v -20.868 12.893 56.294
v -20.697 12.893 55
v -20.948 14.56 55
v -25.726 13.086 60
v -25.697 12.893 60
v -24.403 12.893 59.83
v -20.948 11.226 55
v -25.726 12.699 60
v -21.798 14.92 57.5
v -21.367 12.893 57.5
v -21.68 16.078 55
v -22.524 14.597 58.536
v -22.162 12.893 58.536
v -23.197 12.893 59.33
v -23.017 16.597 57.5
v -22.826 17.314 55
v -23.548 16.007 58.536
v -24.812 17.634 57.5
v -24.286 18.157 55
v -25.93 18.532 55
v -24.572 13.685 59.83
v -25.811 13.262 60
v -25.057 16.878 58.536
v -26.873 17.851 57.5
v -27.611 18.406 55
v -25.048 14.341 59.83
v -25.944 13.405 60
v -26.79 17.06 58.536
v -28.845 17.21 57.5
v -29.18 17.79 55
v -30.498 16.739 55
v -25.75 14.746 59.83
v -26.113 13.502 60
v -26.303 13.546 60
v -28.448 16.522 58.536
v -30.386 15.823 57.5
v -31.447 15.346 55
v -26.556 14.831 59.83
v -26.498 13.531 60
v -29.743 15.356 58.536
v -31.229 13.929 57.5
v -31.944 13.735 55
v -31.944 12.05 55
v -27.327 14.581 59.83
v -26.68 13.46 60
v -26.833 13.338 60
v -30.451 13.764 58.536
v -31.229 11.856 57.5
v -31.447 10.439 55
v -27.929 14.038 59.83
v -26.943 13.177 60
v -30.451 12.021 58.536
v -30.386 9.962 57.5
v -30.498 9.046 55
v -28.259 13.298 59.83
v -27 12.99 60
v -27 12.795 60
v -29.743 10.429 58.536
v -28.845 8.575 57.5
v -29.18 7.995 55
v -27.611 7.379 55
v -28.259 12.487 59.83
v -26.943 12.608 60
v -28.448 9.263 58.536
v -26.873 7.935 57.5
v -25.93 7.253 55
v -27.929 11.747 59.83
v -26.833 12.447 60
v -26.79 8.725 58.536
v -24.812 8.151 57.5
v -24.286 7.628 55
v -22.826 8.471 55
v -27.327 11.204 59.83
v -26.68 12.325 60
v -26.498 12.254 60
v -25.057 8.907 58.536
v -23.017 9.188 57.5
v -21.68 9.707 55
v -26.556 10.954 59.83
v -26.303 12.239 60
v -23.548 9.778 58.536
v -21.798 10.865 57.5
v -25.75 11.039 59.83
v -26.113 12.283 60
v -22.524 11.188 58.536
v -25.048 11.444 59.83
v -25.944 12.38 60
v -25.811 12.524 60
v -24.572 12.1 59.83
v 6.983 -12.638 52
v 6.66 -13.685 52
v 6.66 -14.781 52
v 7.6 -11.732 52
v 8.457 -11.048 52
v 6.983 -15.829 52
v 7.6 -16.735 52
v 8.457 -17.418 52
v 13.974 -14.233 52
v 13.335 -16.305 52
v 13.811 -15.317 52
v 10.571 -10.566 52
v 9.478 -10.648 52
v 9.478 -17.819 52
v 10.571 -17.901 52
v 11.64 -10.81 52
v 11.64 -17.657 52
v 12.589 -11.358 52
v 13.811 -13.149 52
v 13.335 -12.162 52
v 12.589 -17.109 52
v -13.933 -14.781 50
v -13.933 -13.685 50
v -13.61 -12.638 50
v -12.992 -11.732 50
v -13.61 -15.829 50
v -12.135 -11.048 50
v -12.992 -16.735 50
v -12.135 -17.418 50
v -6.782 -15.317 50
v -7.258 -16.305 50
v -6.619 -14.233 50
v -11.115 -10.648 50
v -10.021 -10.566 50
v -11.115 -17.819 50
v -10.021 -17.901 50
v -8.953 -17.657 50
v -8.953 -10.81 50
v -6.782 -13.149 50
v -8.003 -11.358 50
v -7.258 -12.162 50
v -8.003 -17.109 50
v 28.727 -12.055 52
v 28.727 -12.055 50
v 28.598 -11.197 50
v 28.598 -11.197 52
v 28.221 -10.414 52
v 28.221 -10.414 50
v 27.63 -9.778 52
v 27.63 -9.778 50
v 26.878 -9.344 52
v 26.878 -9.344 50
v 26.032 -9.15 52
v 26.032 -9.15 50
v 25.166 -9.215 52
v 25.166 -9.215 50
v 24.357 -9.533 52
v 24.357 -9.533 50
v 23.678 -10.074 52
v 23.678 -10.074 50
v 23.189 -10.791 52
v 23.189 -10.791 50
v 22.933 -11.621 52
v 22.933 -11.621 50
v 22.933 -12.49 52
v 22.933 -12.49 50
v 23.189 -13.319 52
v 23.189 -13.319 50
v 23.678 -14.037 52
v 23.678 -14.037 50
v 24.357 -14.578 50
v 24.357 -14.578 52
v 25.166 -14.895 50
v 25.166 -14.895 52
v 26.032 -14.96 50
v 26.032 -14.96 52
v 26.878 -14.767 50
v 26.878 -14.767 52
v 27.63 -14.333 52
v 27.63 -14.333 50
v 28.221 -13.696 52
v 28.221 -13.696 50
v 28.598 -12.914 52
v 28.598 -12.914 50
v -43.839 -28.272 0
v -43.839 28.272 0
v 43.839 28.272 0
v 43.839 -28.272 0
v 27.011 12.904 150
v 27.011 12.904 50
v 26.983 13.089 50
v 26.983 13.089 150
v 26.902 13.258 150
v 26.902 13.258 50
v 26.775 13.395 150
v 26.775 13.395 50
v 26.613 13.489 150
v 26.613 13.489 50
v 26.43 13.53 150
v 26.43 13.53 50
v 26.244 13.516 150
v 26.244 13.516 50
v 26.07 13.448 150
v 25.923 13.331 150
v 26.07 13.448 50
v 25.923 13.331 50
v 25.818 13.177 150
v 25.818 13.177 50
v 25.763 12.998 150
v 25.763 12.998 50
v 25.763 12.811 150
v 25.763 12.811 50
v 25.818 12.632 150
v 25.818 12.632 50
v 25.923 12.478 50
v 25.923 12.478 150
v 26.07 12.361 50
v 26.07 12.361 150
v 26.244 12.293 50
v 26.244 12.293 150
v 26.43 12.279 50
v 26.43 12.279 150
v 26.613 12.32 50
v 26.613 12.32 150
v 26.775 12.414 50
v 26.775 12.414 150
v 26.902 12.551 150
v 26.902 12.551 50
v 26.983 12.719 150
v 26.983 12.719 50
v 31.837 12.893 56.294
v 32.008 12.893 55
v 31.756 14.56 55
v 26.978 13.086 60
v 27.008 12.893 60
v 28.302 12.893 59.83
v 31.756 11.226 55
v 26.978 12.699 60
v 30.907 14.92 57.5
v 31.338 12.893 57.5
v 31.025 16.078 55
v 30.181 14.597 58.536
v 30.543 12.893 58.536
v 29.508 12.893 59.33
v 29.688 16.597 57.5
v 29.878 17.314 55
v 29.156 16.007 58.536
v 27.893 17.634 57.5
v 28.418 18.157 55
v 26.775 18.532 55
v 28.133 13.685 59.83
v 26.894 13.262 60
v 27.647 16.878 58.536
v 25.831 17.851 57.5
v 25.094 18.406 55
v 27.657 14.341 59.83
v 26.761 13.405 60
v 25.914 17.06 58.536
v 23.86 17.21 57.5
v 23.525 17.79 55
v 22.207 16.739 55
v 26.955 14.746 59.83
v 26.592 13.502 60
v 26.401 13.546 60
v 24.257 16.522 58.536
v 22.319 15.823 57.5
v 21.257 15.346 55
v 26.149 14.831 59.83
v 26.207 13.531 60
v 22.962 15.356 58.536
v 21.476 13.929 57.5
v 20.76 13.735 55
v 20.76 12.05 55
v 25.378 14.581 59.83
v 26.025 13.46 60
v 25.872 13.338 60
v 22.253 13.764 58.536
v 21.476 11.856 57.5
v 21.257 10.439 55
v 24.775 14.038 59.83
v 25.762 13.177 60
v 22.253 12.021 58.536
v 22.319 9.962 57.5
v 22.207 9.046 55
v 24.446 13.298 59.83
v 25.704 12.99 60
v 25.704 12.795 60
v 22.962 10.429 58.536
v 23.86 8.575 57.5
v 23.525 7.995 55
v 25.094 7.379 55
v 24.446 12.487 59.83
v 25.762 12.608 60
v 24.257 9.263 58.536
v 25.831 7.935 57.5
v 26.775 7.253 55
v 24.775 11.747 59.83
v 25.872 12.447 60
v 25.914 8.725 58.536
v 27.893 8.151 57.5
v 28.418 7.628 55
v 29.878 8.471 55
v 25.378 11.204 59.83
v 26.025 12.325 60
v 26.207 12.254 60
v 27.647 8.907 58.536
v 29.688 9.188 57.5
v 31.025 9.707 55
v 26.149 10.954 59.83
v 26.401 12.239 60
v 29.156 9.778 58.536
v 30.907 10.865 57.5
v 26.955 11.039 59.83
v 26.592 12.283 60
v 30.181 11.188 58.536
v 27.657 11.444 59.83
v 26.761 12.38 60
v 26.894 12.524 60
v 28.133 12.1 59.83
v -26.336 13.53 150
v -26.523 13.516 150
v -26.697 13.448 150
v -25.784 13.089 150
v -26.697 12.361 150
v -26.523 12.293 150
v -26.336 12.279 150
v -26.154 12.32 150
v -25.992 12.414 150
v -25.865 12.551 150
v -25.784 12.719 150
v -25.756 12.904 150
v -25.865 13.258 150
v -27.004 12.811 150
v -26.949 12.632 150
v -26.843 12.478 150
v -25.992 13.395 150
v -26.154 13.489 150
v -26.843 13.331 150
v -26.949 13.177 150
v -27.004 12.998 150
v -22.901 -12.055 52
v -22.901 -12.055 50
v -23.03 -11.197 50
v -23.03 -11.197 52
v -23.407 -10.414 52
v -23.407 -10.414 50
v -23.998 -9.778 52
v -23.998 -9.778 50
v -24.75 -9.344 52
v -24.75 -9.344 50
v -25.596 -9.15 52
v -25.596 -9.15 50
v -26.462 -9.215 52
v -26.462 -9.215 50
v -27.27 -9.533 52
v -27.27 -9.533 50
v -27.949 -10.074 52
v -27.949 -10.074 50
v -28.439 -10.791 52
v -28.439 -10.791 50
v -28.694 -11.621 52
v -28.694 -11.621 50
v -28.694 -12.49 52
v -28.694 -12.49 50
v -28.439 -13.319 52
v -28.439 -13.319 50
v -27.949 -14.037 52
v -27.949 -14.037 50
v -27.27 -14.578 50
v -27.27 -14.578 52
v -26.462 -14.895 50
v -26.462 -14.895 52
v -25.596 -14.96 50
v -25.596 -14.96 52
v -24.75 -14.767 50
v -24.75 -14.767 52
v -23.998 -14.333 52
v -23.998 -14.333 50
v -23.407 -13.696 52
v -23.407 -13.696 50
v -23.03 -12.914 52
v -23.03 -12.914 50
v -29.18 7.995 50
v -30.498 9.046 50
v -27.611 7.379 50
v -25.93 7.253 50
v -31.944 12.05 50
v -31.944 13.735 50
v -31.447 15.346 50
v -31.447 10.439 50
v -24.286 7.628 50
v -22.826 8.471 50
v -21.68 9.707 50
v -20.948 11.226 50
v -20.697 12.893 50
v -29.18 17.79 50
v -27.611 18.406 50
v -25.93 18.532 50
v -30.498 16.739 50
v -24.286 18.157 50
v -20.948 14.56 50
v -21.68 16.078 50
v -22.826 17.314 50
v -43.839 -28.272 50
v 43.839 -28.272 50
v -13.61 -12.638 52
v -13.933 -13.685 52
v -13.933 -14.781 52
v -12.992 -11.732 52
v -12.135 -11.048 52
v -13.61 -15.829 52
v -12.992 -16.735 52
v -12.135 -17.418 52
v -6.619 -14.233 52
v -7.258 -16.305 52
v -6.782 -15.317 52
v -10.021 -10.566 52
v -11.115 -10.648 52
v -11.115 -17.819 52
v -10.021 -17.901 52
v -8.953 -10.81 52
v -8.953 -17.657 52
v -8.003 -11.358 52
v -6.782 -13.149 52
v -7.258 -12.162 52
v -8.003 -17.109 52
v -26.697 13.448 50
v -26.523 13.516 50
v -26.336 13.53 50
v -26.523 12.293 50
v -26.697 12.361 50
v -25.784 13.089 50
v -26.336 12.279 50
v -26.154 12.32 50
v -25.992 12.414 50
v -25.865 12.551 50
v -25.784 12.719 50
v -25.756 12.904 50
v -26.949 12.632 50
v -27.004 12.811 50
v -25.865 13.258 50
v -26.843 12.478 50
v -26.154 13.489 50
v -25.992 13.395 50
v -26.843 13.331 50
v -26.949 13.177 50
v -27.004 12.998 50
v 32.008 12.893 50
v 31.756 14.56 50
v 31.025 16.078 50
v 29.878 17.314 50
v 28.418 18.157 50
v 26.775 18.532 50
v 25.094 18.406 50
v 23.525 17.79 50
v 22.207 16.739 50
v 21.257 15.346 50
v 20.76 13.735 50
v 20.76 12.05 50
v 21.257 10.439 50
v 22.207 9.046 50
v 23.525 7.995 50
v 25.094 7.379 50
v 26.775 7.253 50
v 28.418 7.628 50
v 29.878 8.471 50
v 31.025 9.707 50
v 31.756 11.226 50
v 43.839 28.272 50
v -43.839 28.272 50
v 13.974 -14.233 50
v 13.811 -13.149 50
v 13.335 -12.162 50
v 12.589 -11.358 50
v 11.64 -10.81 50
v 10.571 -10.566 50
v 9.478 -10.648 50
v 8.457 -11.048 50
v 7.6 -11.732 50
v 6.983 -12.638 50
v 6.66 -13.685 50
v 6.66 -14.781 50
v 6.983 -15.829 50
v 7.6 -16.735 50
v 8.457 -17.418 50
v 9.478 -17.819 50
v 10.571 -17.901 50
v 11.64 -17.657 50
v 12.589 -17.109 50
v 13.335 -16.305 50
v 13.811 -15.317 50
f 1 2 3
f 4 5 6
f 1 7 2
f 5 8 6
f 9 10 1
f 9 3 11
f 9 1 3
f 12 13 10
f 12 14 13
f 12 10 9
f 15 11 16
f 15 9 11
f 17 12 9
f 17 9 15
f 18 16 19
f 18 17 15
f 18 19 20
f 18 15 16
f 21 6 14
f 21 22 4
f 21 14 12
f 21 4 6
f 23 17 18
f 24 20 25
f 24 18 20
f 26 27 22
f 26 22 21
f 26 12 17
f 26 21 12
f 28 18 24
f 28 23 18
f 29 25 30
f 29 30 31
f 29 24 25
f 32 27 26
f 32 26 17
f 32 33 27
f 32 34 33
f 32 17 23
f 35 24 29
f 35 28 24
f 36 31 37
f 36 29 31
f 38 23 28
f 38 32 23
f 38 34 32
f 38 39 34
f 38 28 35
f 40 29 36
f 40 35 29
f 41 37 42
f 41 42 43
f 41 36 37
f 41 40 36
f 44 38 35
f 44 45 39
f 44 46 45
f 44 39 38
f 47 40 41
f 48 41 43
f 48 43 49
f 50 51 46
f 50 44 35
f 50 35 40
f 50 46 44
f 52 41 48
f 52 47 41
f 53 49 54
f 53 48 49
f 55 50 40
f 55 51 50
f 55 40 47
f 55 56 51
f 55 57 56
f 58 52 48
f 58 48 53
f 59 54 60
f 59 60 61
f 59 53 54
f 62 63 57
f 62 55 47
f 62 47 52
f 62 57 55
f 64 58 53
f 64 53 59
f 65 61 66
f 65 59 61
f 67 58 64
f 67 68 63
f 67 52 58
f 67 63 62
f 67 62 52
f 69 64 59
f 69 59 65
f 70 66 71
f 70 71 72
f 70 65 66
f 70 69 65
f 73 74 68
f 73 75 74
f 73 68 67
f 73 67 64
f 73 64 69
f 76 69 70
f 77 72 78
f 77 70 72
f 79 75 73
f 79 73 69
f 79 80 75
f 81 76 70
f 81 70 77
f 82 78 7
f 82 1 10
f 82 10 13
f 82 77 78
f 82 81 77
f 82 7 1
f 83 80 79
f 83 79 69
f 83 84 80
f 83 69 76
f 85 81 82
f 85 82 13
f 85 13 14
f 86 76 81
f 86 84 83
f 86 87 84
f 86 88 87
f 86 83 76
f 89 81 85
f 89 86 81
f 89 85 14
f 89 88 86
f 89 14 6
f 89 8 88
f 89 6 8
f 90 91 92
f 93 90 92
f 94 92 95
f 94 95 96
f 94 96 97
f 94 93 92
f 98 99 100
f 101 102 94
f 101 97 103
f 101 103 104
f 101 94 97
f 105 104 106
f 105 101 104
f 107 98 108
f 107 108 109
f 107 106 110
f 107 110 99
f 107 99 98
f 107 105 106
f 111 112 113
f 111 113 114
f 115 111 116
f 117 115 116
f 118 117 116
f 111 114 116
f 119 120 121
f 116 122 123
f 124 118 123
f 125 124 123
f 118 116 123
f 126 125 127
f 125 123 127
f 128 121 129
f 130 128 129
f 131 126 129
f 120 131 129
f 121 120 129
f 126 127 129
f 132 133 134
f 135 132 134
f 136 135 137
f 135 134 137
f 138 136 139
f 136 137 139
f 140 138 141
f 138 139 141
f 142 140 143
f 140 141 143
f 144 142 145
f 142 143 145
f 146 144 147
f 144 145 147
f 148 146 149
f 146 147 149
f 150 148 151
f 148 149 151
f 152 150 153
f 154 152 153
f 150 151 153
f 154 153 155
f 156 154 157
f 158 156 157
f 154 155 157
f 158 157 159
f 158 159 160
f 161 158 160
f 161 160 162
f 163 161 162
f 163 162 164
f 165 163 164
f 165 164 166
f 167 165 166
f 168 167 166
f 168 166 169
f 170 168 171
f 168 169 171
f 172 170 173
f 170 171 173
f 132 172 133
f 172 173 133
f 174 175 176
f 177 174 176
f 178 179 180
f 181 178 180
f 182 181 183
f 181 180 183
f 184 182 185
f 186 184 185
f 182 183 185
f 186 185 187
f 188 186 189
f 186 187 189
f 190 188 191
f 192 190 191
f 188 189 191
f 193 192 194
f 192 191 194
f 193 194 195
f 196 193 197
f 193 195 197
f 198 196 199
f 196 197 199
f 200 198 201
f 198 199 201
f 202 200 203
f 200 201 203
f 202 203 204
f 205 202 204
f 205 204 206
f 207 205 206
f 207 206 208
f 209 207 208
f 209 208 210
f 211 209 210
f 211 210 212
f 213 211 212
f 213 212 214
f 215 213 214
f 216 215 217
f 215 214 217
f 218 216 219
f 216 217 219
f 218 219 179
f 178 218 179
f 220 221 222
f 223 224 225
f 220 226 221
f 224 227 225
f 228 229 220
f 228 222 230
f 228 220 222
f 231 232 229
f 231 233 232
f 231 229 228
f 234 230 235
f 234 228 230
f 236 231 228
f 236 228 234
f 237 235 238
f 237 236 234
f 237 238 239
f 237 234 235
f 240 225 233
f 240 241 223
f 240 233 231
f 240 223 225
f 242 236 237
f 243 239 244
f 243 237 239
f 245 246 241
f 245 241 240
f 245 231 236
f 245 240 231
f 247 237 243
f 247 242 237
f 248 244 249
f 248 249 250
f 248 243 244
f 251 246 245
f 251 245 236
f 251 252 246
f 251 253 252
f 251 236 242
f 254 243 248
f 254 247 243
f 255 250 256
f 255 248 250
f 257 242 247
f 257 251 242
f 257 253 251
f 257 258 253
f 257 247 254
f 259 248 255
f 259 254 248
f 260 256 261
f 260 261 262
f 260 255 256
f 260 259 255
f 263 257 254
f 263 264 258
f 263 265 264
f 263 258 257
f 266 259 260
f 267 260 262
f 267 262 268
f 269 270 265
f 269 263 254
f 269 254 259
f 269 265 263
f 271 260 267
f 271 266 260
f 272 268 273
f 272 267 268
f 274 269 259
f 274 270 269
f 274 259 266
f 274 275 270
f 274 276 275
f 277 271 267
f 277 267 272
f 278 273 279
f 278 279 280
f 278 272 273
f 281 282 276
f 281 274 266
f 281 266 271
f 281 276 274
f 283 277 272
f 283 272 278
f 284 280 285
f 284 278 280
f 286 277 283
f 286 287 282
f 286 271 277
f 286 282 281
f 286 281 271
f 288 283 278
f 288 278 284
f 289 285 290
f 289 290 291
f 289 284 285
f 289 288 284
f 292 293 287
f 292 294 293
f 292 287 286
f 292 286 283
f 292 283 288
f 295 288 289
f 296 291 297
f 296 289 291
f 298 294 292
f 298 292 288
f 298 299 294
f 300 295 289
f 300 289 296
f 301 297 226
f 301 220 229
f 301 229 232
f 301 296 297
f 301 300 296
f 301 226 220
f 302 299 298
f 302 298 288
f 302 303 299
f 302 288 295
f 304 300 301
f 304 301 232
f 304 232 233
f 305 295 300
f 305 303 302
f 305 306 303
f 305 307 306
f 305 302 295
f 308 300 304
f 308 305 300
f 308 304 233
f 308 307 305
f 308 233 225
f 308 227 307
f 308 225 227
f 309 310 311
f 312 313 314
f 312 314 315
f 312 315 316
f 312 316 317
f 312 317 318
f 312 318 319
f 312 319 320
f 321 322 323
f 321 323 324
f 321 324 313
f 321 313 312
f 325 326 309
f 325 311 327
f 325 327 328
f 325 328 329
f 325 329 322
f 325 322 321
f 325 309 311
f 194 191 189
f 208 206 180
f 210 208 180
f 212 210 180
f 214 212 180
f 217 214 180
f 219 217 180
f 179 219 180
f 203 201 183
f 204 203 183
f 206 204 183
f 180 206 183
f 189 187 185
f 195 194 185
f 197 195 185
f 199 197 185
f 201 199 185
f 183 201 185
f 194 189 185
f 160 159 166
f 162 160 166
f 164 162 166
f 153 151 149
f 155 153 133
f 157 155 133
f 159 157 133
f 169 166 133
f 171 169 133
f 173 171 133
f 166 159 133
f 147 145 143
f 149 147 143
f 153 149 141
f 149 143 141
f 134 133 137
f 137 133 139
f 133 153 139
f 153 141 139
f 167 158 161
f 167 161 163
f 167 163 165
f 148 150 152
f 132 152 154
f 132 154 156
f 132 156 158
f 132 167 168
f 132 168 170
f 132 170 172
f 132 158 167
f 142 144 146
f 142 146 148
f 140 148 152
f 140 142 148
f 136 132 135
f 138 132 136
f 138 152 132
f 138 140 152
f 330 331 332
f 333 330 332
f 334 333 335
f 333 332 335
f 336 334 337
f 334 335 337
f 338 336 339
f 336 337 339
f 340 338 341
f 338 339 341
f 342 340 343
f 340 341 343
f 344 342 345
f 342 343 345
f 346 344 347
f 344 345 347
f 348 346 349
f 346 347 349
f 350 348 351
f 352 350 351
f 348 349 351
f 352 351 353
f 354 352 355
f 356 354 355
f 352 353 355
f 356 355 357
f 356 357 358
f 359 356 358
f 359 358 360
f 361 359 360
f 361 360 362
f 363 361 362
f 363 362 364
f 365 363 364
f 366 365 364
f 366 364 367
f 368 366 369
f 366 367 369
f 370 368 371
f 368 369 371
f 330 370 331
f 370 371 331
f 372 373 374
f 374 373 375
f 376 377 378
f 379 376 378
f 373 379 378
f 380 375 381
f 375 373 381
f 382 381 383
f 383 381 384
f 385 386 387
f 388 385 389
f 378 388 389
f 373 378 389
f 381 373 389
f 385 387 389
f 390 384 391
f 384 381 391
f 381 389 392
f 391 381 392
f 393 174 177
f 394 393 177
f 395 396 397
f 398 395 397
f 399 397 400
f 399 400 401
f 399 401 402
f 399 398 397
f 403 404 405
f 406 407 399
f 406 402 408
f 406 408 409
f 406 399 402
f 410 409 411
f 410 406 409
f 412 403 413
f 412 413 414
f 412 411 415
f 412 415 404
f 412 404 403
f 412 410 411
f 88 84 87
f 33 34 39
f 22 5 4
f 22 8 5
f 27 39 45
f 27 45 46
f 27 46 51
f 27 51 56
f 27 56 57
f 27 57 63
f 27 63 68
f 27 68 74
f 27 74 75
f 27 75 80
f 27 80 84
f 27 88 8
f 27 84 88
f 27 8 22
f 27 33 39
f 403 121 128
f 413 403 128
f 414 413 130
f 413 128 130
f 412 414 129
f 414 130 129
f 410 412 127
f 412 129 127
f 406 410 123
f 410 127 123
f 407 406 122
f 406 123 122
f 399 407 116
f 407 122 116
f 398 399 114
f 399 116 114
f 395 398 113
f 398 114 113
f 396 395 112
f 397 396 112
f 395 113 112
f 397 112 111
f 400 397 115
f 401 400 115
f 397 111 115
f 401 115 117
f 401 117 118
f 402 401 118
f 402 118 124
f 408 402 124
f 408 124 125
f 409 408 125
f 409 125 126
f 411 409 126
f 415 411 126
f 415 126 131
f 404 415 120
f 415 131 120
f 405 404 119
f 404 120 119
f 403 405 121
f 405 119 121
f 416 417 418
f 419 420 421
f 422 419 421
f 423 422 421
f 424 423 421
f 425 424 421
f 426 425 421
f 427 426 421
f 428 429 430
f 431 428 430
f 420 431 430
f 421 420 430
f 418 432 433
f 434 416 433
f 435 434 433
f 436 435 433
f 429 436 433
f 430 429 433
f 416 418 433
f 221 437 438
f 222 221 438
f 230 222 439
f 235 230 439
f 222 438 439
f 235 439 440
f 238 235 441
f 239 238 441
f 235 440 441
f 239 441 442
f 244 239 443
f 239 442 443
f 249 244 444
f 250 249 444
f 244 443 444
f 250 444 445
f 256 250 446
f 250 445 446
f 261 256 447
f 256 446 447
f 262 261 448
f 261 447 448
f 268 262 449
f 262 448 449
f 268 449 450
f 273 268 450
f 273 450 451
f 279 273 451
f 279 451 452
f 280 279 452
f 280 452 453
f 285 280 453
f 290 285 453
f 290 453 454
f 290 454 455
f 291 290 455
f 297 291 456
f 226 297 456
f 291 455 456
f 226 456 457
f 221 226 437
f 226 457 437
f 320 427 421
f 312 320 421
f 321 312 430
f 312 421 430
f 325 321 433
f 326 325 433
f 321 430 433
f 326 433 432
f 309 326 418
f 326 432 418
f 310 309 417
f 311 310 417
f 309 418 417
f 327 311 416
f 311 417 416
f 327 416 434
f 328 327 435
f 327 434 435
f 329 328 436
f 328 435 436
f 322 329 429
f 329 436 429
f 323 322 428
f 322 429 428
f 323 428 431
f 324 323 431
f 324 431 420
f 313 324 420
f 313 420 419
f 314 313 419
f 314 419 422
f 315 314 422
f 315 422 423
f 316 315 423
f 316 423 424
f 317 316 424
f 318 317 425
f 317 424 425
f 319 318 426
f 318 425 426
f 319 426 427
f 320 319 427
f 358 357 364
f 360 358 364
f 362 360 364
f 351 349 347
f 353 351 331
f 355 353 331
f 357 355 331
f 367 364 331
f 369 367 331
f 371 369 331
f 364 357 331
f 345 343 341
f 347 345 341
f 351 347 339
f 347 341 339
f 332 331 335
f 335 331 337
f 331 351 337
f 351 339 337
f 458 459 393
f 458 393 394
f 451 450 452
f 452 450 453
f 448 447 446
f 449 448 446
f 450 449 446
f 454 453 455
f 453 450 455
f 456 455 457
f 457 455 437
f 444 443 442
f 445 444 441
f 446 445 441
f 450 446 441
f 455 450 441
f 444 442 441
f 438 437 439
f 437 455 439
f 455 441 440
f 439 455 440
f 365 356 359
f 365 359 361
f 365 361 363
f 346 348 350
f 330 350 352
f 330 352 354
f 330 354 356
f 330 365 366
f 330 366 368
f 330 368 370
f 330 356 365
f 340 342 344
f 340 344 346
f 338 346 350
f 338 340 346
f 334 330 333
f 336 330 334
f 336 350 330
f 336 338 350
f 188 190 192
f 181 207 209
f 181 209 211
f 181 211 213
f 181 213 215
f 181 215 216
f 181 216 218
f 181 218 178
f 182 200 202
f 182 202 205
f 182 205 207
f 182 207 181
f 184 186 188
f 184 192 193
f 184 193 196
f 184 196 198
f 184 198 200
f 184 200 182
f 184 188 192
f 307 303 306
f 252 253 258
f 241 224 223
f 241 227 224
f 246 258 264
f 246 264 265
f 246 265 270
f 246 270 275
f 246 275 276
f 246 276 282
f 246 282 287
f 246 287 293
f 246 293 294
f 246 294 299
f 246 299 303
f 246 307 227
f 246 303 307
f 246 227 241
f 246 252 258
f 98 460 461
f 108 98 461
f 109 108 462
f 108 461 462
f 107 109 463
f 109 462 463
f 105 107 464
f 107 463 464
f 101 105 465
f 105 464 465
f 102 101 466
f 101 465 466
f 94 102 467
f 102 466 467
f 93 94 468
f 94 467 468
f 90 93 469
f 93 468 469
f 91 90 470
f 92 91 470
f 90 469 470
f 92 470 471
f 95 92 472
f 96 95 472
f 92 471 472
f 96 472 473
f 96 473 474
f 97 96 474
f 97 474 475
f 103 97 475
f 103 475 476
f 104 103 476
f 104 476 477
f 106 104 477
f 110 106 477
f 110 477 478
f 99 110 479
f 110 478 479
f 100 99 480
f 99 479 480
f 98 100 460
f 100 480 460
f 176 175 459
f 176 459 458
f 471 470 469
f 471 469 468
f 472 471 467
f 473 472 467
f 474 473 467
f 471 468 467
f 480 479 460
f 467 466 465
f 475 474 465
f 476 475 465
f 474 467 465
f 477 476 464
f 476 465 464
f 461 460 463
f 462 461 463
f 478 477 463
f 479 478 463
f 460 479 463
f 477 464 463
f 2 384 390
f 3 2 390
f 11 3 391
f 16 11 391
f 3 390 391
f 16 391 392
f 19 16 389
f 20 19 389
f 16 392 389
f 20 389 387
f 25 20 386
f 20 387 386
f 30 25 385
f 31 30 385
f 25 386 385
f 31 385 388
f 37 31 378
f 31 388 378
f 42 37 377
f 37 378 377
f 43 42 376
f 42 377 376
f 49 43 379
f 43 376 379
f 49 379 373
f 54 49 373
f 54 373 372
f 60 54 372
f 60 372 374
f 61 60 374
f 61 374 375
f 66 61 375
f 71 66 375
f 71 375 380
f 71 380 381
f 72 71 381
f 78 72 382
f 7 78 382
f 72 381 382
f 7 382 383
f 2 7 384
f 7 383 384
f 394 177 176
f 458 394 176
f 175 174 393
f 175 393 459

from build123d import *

# Parameters (mm, degrees)
F0_W     = 87.678052
F0_H     = 56.544334
F1_DEPTH = 50
F2_R     = 5.655174
F3_DEPTH = 10
F4_R     = 2.913078
F4_R_2   = 3.677741
F5_DEPTH = 2
F6_R     = 5
F7_R     = 0.627587
F8_DEPTH = 100


with BuildPart() as f1:
    # F0 (on Top) → F1 (new body)
    with BuildSketch(Plane.XY):
        Rectangle(F0_W, F0_H)
    extrude(amount=F1_DEPTH)


with BuildPart() as f3:
    # F2 (on face) → F3 (new body)
    with BuildSketch(Plane.XY.offset(50)):
        with Locations((-26.352344, 12.892613)):
            Circle(F2_R)
        with Locations((26.352344, 12.892613)):
            Circle(F2_R)
    extrude(amount=F3_DEPTH)

    # F6
    f6_edges = [f3.edges().sort_by_distance(p)[0] for p in [
        (20.69717, 12.892613, 60),
        (-32.007518, 12.892613, 60),
    ]]
    fillet(f6_edges, radius=F6_R)


with BuildPart() as f5:
    # F4 (on face) → F5 (new body)
    with BuildSketch(Plane.XY.offset(50)):
        with Locations((-25.813926, -12.055391)):
            Circle(F4_R)
        with Locations((-10.296327, -14.233299)):
            Circle(F4_R_2)
        with Locations((10.296327, -14.233299)):
            Circle(F4_R_2)
        with Locations((25.813926, -12.055391)):
            Circle(F4_R)
    extrude(amount=F5_DEPTH)


with BuildPart() as f8:
    # F7 (on face) → F8 (new body)
    with BuildSketch(Plane.XY.offset(50)):
        with Locations((-26.383389, 12.904418)):
            Circle(F7_R)
        with Locations((26.383389, 12.904418)):
            Circle(F7_R)
    extrude(amount=F8_DEPTH)


solid = Compound([f1.part, f3.part, f5.part, f8.part])
